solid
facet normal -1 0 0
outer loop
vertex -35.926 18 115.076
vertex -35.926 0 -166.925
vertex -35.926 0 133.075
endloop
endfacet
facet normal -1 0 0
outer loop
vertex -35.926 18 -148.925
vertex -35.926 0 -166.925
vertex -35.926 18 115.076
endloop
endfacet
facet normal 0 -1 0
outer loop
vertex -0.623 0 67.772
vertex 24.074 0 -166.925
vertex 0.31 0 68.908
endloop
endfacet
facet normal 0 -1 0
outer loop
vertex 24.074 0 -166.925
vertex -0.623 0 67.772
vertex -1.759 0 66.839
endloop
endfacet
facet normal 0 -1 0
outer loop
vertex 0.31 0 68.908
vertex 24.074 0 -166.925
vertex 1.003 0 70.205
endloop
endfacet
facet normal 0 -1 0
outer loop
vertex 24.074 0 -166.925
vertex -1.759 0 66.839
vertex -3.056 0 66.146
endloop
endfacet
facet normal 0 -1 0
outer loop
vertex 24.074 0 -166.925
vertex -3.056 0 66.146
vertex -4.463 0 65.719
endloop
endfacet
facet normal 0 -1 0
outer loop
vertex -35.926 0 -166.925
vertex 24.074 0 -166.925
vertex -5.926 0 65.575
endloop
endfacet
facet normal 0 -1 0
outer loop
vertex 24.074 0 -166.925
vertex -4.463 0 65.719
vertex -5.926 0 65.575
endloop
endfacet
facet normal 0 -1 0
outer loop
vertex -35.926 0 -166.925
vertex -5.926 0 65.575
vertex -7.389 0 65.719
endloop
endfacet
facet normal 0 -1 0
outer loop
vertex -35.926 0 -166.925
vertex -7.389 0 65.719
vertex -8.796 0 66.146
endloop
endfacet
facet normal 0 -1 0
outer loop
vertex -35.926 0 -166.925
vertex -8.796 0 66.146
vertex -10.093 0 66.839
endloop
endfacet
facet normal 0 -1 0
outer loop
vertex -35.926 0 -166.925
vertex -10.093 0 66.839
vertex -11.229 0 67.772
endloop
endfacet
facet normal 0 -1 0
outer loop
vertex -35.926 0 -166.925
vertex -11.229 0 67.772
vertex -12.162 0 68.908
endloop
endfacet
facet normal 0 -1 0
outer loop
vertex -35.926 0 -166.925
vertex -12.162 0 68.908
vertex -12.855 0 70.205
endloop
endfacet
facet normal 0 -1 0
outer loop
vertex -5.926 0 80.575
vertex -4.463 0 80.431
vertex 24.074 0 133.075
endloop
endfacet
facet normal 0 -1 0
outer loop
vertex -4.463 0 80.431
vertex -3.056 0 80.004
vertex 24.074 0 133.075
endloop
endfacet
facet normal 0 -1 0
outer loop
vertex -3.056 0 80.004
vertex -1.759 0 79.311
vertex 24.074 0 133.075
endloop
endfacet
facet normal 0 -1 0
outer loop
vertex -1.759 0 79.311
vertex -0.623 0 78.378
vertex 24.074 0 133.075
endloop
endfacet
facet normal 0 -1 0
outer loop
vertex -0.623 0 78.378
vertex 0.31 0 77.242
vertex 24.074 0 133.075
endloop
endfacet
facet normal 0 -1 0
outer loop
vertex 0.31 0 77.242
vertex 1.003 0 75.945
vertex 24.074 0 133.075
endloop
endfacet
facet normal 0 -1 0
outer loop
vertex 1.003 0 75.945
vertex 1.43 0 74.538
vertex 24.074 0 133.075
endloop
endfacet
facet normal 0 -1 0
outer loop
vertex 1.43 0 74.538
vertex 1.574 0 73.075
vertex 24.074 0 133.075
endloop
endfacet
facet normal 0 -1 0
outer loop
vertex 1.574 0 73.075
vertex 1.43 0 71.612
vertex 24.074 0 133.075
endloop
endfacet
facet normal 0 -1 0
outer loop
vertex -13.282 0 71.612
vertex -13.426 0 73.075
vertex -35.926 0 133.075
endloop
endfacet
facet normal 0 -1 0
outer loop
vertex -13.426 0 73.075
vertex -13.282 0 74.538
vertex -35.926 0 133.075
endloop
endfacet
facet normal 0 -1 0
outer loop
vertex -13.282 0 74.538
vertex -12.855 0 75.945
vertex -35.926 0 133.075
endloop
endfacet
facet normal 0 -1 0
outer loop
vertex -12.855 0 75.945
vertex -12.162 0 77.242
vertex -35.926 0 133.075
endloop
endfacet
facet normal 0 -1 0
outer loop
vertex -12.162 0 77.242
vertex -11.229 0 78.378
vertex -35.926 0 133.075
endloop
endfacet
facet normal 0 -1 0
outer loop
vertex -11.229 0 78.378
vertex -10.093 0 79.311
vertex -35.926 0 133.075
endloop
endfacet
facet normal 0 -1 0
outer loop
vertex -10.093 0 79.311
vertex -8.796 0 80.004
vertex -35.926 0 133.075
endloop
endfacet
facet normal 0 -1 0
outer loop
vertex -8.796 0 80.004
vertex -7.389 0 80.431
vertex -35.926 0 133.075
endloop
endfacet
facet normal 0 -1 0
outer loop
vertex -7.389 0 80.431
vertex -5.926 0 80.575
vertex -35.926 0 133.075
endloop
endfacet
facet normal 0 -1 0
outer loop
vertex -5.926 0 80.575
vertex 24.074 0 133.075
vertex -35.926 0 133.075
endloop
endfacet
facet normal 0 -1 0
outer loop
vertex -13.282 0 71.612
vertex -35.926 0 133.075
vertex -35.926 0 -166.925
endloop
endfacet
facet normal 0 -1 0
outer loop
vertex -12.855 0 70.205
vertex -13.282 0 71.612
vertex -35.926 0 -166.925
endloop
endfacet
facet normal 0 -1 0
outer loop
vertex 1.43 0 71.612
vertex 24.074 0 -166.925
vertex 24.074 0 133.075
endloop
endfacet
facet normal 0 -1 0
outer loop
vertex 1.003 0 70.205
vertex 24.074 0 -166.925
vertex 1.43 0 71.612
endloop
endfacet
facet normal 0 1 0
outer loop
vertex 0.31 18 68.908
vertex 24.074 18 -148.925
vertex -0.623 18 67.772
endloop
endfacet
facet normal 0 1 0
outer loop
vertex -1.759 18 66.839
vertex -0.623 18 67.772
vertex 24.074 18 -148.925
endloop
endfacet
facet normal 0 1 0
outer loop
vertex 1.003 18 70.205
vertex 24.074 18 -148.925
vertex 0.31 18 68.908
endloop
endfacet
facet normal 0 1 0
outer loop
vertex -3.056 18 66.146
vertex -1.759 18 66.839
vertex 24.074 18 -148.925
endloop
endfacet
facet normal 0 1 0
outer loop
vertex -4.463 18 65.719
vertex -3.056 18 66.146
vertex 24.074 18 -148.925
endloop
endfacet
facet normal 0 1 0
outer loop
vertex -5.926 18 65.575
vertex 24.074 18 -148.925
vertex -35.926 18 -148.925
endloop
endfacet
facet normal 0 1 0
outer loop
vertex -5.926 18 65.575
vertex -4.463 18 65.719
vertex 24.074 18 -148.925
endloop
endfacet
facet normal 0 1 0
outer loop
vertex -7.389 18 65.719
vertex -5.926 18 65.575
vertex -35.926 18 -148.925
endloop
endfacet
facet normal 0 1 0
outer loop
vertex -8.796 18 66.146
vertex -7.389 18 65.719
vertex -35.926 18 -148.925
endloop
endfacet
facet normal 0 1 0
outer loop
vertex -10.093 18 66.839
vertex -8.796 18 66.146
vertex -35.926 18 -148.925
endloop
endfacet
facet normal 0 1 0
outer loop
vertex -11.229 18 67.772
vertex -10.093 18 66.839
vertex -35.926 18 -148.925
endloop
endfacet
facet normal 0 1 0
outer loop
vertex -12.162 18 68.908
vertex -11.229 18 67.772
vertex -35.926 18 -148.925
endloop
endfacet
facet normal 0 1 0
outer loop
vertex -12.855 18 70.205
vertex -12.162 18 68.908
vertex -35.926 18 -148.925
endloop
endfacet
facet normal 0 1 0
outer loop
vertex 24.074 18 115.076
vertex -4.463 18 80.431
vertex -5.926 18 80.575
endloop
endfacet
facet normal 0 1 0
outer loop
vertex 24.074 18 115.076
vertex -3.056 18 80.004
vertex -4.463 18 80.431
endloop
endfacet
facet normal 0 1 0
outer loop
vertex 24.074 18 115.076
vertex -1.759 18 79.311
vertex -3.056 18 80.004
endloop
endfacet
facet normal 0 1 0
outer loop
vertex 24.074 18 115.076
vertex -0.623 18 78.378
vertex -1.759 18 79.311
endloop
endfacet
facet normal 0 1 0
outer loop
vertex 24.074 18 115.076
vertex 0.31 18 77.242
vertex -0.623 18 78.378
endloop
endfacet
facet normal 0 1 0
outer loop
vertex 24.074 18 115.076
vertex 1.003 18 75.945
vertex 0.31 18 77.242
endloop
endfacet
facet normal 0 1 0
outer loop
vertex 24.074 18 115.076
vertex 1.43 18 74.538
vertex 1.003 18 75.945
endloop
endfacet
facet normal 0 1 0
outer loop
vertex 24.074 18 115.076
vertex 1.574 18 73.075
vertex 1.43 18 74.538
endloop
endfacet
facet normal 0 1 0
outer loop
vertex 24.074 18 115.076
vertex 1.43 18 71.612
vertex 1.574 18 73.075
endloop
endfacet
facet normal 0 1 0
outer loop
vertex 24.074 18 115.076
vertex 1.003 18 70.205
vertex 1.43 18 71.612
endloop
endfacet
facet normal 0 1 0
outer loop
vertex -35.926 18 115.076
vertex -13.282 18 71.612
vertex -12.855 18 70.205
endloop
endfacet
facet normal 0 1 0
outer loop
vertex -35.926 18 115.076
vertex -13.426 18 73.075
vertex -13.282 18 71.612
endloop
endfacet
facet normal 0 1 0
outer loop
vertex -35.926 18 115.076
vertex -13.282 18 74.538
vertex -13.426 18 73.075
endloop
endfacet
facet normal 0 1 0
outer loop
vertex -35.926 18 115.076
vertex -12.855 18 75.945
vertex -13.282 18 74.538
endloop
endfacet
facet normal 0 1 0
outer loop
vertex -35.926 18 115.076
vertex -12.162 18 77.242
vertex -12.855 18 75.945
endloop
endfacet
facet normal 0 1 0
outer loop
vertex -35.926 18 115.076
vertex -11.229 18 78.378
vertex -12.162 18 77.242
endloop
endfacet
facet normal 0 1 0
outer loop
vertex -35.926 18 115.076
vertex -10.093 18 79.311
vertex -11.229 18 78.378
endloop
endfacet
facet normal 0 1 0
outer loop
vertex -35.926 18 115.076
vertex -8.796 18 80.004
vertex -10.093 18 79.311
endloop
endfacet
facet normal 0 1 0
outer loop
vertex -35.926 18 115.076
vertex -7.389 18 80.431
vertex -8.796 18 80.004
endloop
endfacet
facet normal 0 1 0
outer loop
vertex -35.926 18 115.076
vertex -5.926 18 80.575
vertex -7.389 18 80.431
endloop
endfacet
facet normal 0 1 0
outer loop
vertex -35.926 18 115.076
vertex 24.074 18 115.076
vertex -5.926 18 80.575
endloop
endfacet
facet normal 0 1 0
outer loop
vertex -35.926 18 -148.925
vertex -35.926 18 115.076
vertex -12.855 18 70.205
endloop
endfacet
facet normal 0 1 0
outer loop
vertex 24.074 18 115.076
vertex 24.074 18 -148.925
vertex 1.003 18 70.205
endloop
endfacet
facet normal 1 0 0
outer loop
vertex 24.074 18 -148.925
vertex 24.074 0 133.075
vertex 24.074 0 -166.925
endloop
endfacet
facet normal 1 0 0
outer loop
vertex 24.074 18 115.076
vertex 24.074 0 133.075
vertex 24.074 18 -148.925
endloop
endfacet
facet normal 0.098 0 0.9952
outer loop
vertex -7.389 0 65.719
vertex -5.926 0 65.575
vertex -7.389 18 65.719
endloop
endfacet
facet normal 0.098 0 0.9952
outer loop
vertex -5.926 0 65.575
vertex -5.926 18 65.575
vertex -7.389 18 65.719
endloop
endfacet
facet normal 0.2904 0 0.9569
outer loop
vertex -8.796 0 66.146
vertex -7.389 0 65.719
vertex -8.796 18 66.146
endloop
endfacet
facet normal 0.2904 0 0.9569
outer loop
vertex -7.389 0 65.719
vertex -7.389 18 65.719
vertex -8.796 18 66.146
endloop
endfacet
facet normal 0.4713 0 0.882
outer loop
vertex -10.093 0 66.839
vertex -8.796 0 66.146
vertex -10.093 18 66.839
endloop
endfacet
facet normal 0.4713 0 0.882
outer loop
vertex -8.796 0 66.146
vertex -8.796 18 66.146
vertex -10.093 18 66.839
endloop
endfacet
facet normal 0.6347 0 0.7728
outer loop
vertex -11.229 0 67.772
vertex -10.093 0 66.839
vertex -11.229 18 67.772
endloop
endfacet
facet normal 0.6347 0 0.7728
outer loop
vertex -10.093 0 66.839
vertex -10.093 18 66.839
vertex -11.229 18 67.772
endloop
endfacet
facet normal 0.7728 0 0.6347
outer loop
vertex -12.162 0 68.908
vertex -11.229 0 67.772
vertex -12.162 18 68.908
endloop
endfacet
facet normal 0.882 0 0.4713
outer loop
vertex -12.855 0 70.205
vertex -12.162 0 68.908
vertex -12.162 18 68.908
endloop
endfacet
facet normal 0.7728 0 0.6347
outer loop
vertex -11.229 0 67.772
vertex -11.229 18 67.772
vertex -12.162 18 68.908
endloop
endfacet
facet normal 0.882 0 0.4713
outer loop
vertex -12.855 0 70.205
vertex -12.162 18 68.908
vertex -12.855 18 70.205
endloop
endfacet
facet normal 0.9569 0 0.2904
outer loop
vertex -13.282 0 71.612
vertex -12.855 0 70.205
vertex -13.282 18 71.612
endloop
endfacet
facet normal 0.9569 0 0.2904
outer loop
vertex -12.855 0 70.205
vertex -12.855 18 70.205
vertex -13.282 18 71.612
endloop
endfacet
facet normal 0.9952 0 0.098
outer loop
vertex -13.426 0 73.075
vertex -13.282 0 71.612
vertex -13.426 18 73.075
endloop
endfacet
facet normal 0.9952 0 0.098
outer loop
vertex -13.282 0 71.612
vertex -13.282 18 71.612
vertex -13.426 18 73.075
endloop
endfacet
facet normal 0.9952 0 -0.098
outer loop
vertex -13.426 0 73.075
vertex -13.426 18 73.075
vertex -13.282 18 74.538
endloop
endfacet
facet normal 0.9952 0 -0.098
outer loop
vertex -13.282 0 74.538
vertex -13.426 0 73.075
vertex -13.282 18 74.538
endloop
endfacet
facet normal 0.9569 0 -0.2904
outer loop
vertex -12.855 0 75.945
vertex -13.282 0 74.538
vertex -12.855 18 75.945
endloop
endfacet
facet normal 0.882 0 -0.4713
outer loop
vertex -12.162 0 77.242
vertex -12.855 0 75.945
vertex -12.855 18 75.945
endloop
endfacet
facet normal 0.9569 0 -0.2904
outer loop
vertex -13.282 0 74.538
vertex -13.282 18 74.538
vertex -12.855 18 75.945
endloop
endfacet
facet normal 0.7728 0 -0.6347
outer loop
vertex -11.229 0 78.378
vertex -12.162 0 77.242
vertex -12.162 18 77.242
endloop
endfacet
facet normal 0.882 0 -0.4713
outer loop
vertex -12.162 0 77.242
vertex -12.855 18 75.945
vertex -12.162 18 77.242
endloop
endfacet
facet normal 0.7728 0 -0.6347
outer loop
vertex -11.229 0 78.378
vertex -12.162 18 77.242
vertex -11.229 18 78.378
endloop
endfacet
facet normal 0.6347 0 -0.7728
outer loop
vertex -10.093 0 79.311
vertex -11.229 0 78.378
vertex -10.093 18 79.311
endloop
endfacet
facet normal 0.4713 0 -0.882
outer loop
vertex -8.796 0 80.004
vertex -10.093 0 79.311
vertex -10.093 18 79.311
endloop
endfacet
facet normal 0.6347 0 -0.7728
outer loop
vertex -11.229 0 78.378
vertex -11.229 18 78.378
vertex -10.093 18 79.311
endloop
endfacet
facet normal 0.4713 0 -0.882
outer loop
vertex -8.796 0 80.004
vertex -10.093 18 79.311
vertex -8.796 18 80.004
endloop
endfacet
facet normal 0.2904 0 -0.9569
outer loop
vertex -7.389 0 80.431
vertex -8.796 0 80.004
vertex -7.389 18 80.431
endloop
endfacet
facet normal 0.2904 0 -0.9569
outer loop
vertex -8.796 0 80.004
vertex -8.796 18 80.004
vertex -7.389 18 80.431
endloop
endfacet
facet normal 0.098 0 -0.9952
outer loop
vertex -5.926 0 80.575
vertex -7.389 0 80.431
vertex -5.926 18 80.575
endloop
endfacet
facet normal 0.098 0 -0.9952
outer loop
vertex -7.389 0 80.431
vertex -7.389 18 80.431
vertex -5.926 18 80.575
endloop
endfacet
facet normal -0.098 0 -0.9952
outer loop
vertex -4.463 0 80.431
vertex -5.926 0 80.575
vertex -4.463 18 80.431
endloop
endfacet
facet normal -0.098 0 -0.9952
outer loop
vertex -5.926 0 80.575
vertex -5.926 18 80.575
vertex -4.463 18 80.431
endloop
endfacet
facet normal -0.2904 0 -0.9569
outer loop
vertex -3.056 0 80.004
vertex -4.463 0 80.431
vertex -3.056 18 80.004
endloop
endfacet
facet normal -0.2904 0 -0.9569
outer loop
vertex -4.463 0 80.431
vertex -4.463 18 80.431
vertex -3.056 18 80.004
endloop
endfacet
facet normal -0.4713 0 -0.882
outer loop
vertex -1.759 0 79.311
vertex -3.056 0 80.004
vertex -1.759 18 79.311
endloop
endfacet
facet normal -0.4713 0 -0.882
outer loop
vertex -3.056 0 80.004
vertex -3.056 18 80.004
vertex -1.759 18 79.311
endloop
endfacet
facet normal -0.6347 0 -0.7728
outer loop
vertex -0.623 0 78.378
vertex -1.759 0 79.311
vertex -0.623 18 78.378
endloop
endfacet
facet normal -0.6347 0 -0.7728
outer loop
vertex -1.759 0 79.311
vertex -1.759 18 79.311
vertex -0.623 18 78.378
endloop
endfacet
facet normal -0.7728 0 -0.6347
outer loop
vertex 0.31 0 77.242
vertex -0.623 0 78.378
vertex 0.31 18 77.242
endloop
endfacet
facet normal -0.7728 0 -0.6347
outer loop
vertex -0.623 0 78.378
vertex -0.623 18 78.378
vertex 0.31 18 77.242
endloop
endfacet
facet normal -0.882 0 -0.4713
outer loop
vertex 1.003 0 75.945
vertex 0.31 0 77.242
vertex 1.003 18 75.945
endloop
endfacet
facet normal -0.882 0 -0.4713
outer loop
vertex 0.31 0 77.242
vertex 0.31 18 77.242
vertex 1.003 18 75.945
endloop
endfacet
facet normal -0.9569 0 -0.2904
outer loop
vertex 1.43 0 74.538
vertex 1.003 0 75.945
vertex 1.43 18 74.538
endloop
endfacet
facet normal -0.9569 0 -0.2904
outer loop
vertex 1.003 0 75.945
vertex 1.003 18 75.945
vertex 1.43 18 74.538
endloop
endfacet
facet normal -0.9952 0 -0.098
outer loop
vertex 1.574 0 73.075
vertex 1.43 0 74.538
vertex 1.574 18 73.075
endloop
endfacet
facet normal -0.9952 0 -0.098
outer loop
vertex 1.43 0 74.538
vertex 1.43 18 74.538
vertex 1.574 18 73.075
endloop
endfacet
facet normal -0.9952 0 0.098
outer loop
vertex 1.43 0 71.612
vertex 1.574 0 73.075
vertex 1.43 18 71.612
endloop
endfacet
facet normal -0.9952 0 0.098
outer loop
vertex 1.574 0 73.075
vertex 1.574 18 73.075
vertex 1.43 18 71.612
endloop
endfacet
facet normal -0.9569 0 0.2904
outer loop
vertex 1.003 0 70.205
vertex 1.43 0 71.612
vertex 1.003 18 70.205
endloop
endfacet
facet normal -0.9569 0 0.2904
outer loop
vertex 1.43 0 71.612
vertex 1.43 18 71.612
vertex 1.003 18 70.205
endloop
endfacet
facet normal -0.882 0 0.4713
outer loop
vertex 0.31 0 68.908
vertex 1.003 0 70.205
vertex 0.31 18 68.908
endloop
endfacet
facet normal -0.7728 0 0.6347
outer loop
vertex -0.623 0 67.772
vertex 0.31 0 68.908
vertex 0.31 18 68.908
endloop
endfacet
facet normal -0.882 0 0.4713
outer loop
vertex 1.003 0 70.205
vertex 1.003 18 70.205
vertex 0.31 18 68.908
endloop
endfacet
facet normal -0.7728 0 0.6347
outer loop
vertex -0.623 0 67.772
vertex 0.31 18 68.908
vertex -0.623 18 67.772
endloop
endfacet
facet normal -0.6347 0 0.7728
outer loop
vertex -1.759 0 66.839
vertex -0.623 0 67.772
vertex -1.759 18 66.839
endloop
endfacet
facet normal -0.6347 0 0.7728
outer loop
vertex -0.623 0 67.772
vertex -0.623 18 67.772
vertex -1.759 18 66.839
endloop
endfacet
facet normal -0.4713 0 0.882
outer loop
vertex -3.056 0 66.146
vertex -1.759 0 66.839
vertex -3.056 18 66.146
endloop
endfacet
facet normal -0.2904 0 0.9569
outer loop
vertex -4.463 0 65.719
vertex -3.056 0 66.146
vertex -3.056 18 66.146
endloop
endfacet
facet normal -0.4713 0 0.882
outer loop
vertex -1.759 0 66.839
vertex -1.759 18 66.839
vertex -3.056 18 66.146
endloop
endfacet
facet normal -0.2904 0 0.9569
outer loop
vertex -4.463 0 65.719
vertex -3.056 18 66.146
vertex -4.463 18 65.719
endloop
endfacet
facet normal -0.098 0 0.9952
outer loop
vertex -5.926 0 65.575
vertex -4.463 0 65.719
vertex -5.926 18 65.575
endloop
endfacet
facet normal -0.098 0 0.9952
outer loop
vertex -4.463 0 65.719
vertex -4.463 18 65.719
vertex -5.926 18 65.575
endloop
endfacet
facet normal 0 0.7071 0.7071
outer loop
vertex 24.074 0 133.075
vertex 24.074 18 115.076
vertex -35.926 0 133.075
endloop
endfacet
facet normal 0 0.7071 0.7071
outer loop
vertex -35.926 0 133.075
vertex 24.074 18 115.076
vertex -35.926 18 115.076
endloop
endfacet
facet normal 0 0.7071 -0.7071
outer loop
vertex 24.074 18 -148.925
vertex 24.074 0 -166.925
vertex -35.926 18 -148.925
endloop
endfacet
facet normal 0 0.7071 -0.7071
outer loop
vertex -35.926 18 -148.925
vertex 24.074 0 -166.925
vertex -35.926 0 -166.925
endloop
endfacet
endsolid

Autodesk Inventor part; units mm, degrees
ref_plane "YZ Plane" through (0, 0, 0) normal (1, 0, 0) x (0, 1, 0)
ref_plane "XZ Plane" through (0, 0, 0) normal (0, 1, 0) x (-1, 0, 0)
ref_plane "XY Plane" through (0, 0, 0) normal (0, 0, 1) x (1, 0, 0)
sketch "Skizze1" plane through (0, 0, 0) normal (0, 1, 0) x (-1, 0, 0)
  line L0 (35.9259, 133.0751) -> (-24.0741, 133.0751)
  line L1 (-24.0741, 133.0751) -> (-24.0741, -166.9249)
  line L2 (-24.0741, -166.9249) -> (35.9259, -166.9249)
  line L3 (35.9259, -166.9249) -> (35.9259, 133.0751)
  point P0 (0, 0)
  point P1 (5.9259, 83.0751)
  dimension "d0" = 60
  dimension "d1" = 300
  dimension "d24" = 30
  dimension "d25" = 50
extrude "Extrusion1" add sketch "Skizze1" along normal blind 18
chamfer "Fase1" distance 18 angle 45 1 edges at (-5.9259, 18, 133.0751)
chamfer "Fase2" distance 18 angle 45 1 edges at (-5.9259, 18, -166.9249)
sketch "Skizze4" plane through (0, 0, 0) normal (0, -1, 0) x (1, 0, 0)
  line L0 (-35.9259, -166.9249) -> (-35.9259, 133.0751) projected
  line L1 (-35.9259, 133.0751) -> (24.0741, 133.0751) projected
  point P0 (0, 0)
  point P1 (-5.9259, 73.0751)
  dimension "d33" = 30
  dimension "d34" = 60
hole "Bohrung5" at (-5.9259, 0, 73.0751) direction (0, 1, 0) diameter 15 end through all
sketch "Skizze2" plane through (0, 18, 0) normal (0, 1, 0) x (1, 0, 0)
  point P0 (38.0741, -40.5751)
sketch "Skizze3" plane through (0, 18, 0) normal (0, 1, 0) x (1, 0, 0)
  point P0 (38.0741, 74.4249)
properties part number "Front" material "Holz (Eiche)"
